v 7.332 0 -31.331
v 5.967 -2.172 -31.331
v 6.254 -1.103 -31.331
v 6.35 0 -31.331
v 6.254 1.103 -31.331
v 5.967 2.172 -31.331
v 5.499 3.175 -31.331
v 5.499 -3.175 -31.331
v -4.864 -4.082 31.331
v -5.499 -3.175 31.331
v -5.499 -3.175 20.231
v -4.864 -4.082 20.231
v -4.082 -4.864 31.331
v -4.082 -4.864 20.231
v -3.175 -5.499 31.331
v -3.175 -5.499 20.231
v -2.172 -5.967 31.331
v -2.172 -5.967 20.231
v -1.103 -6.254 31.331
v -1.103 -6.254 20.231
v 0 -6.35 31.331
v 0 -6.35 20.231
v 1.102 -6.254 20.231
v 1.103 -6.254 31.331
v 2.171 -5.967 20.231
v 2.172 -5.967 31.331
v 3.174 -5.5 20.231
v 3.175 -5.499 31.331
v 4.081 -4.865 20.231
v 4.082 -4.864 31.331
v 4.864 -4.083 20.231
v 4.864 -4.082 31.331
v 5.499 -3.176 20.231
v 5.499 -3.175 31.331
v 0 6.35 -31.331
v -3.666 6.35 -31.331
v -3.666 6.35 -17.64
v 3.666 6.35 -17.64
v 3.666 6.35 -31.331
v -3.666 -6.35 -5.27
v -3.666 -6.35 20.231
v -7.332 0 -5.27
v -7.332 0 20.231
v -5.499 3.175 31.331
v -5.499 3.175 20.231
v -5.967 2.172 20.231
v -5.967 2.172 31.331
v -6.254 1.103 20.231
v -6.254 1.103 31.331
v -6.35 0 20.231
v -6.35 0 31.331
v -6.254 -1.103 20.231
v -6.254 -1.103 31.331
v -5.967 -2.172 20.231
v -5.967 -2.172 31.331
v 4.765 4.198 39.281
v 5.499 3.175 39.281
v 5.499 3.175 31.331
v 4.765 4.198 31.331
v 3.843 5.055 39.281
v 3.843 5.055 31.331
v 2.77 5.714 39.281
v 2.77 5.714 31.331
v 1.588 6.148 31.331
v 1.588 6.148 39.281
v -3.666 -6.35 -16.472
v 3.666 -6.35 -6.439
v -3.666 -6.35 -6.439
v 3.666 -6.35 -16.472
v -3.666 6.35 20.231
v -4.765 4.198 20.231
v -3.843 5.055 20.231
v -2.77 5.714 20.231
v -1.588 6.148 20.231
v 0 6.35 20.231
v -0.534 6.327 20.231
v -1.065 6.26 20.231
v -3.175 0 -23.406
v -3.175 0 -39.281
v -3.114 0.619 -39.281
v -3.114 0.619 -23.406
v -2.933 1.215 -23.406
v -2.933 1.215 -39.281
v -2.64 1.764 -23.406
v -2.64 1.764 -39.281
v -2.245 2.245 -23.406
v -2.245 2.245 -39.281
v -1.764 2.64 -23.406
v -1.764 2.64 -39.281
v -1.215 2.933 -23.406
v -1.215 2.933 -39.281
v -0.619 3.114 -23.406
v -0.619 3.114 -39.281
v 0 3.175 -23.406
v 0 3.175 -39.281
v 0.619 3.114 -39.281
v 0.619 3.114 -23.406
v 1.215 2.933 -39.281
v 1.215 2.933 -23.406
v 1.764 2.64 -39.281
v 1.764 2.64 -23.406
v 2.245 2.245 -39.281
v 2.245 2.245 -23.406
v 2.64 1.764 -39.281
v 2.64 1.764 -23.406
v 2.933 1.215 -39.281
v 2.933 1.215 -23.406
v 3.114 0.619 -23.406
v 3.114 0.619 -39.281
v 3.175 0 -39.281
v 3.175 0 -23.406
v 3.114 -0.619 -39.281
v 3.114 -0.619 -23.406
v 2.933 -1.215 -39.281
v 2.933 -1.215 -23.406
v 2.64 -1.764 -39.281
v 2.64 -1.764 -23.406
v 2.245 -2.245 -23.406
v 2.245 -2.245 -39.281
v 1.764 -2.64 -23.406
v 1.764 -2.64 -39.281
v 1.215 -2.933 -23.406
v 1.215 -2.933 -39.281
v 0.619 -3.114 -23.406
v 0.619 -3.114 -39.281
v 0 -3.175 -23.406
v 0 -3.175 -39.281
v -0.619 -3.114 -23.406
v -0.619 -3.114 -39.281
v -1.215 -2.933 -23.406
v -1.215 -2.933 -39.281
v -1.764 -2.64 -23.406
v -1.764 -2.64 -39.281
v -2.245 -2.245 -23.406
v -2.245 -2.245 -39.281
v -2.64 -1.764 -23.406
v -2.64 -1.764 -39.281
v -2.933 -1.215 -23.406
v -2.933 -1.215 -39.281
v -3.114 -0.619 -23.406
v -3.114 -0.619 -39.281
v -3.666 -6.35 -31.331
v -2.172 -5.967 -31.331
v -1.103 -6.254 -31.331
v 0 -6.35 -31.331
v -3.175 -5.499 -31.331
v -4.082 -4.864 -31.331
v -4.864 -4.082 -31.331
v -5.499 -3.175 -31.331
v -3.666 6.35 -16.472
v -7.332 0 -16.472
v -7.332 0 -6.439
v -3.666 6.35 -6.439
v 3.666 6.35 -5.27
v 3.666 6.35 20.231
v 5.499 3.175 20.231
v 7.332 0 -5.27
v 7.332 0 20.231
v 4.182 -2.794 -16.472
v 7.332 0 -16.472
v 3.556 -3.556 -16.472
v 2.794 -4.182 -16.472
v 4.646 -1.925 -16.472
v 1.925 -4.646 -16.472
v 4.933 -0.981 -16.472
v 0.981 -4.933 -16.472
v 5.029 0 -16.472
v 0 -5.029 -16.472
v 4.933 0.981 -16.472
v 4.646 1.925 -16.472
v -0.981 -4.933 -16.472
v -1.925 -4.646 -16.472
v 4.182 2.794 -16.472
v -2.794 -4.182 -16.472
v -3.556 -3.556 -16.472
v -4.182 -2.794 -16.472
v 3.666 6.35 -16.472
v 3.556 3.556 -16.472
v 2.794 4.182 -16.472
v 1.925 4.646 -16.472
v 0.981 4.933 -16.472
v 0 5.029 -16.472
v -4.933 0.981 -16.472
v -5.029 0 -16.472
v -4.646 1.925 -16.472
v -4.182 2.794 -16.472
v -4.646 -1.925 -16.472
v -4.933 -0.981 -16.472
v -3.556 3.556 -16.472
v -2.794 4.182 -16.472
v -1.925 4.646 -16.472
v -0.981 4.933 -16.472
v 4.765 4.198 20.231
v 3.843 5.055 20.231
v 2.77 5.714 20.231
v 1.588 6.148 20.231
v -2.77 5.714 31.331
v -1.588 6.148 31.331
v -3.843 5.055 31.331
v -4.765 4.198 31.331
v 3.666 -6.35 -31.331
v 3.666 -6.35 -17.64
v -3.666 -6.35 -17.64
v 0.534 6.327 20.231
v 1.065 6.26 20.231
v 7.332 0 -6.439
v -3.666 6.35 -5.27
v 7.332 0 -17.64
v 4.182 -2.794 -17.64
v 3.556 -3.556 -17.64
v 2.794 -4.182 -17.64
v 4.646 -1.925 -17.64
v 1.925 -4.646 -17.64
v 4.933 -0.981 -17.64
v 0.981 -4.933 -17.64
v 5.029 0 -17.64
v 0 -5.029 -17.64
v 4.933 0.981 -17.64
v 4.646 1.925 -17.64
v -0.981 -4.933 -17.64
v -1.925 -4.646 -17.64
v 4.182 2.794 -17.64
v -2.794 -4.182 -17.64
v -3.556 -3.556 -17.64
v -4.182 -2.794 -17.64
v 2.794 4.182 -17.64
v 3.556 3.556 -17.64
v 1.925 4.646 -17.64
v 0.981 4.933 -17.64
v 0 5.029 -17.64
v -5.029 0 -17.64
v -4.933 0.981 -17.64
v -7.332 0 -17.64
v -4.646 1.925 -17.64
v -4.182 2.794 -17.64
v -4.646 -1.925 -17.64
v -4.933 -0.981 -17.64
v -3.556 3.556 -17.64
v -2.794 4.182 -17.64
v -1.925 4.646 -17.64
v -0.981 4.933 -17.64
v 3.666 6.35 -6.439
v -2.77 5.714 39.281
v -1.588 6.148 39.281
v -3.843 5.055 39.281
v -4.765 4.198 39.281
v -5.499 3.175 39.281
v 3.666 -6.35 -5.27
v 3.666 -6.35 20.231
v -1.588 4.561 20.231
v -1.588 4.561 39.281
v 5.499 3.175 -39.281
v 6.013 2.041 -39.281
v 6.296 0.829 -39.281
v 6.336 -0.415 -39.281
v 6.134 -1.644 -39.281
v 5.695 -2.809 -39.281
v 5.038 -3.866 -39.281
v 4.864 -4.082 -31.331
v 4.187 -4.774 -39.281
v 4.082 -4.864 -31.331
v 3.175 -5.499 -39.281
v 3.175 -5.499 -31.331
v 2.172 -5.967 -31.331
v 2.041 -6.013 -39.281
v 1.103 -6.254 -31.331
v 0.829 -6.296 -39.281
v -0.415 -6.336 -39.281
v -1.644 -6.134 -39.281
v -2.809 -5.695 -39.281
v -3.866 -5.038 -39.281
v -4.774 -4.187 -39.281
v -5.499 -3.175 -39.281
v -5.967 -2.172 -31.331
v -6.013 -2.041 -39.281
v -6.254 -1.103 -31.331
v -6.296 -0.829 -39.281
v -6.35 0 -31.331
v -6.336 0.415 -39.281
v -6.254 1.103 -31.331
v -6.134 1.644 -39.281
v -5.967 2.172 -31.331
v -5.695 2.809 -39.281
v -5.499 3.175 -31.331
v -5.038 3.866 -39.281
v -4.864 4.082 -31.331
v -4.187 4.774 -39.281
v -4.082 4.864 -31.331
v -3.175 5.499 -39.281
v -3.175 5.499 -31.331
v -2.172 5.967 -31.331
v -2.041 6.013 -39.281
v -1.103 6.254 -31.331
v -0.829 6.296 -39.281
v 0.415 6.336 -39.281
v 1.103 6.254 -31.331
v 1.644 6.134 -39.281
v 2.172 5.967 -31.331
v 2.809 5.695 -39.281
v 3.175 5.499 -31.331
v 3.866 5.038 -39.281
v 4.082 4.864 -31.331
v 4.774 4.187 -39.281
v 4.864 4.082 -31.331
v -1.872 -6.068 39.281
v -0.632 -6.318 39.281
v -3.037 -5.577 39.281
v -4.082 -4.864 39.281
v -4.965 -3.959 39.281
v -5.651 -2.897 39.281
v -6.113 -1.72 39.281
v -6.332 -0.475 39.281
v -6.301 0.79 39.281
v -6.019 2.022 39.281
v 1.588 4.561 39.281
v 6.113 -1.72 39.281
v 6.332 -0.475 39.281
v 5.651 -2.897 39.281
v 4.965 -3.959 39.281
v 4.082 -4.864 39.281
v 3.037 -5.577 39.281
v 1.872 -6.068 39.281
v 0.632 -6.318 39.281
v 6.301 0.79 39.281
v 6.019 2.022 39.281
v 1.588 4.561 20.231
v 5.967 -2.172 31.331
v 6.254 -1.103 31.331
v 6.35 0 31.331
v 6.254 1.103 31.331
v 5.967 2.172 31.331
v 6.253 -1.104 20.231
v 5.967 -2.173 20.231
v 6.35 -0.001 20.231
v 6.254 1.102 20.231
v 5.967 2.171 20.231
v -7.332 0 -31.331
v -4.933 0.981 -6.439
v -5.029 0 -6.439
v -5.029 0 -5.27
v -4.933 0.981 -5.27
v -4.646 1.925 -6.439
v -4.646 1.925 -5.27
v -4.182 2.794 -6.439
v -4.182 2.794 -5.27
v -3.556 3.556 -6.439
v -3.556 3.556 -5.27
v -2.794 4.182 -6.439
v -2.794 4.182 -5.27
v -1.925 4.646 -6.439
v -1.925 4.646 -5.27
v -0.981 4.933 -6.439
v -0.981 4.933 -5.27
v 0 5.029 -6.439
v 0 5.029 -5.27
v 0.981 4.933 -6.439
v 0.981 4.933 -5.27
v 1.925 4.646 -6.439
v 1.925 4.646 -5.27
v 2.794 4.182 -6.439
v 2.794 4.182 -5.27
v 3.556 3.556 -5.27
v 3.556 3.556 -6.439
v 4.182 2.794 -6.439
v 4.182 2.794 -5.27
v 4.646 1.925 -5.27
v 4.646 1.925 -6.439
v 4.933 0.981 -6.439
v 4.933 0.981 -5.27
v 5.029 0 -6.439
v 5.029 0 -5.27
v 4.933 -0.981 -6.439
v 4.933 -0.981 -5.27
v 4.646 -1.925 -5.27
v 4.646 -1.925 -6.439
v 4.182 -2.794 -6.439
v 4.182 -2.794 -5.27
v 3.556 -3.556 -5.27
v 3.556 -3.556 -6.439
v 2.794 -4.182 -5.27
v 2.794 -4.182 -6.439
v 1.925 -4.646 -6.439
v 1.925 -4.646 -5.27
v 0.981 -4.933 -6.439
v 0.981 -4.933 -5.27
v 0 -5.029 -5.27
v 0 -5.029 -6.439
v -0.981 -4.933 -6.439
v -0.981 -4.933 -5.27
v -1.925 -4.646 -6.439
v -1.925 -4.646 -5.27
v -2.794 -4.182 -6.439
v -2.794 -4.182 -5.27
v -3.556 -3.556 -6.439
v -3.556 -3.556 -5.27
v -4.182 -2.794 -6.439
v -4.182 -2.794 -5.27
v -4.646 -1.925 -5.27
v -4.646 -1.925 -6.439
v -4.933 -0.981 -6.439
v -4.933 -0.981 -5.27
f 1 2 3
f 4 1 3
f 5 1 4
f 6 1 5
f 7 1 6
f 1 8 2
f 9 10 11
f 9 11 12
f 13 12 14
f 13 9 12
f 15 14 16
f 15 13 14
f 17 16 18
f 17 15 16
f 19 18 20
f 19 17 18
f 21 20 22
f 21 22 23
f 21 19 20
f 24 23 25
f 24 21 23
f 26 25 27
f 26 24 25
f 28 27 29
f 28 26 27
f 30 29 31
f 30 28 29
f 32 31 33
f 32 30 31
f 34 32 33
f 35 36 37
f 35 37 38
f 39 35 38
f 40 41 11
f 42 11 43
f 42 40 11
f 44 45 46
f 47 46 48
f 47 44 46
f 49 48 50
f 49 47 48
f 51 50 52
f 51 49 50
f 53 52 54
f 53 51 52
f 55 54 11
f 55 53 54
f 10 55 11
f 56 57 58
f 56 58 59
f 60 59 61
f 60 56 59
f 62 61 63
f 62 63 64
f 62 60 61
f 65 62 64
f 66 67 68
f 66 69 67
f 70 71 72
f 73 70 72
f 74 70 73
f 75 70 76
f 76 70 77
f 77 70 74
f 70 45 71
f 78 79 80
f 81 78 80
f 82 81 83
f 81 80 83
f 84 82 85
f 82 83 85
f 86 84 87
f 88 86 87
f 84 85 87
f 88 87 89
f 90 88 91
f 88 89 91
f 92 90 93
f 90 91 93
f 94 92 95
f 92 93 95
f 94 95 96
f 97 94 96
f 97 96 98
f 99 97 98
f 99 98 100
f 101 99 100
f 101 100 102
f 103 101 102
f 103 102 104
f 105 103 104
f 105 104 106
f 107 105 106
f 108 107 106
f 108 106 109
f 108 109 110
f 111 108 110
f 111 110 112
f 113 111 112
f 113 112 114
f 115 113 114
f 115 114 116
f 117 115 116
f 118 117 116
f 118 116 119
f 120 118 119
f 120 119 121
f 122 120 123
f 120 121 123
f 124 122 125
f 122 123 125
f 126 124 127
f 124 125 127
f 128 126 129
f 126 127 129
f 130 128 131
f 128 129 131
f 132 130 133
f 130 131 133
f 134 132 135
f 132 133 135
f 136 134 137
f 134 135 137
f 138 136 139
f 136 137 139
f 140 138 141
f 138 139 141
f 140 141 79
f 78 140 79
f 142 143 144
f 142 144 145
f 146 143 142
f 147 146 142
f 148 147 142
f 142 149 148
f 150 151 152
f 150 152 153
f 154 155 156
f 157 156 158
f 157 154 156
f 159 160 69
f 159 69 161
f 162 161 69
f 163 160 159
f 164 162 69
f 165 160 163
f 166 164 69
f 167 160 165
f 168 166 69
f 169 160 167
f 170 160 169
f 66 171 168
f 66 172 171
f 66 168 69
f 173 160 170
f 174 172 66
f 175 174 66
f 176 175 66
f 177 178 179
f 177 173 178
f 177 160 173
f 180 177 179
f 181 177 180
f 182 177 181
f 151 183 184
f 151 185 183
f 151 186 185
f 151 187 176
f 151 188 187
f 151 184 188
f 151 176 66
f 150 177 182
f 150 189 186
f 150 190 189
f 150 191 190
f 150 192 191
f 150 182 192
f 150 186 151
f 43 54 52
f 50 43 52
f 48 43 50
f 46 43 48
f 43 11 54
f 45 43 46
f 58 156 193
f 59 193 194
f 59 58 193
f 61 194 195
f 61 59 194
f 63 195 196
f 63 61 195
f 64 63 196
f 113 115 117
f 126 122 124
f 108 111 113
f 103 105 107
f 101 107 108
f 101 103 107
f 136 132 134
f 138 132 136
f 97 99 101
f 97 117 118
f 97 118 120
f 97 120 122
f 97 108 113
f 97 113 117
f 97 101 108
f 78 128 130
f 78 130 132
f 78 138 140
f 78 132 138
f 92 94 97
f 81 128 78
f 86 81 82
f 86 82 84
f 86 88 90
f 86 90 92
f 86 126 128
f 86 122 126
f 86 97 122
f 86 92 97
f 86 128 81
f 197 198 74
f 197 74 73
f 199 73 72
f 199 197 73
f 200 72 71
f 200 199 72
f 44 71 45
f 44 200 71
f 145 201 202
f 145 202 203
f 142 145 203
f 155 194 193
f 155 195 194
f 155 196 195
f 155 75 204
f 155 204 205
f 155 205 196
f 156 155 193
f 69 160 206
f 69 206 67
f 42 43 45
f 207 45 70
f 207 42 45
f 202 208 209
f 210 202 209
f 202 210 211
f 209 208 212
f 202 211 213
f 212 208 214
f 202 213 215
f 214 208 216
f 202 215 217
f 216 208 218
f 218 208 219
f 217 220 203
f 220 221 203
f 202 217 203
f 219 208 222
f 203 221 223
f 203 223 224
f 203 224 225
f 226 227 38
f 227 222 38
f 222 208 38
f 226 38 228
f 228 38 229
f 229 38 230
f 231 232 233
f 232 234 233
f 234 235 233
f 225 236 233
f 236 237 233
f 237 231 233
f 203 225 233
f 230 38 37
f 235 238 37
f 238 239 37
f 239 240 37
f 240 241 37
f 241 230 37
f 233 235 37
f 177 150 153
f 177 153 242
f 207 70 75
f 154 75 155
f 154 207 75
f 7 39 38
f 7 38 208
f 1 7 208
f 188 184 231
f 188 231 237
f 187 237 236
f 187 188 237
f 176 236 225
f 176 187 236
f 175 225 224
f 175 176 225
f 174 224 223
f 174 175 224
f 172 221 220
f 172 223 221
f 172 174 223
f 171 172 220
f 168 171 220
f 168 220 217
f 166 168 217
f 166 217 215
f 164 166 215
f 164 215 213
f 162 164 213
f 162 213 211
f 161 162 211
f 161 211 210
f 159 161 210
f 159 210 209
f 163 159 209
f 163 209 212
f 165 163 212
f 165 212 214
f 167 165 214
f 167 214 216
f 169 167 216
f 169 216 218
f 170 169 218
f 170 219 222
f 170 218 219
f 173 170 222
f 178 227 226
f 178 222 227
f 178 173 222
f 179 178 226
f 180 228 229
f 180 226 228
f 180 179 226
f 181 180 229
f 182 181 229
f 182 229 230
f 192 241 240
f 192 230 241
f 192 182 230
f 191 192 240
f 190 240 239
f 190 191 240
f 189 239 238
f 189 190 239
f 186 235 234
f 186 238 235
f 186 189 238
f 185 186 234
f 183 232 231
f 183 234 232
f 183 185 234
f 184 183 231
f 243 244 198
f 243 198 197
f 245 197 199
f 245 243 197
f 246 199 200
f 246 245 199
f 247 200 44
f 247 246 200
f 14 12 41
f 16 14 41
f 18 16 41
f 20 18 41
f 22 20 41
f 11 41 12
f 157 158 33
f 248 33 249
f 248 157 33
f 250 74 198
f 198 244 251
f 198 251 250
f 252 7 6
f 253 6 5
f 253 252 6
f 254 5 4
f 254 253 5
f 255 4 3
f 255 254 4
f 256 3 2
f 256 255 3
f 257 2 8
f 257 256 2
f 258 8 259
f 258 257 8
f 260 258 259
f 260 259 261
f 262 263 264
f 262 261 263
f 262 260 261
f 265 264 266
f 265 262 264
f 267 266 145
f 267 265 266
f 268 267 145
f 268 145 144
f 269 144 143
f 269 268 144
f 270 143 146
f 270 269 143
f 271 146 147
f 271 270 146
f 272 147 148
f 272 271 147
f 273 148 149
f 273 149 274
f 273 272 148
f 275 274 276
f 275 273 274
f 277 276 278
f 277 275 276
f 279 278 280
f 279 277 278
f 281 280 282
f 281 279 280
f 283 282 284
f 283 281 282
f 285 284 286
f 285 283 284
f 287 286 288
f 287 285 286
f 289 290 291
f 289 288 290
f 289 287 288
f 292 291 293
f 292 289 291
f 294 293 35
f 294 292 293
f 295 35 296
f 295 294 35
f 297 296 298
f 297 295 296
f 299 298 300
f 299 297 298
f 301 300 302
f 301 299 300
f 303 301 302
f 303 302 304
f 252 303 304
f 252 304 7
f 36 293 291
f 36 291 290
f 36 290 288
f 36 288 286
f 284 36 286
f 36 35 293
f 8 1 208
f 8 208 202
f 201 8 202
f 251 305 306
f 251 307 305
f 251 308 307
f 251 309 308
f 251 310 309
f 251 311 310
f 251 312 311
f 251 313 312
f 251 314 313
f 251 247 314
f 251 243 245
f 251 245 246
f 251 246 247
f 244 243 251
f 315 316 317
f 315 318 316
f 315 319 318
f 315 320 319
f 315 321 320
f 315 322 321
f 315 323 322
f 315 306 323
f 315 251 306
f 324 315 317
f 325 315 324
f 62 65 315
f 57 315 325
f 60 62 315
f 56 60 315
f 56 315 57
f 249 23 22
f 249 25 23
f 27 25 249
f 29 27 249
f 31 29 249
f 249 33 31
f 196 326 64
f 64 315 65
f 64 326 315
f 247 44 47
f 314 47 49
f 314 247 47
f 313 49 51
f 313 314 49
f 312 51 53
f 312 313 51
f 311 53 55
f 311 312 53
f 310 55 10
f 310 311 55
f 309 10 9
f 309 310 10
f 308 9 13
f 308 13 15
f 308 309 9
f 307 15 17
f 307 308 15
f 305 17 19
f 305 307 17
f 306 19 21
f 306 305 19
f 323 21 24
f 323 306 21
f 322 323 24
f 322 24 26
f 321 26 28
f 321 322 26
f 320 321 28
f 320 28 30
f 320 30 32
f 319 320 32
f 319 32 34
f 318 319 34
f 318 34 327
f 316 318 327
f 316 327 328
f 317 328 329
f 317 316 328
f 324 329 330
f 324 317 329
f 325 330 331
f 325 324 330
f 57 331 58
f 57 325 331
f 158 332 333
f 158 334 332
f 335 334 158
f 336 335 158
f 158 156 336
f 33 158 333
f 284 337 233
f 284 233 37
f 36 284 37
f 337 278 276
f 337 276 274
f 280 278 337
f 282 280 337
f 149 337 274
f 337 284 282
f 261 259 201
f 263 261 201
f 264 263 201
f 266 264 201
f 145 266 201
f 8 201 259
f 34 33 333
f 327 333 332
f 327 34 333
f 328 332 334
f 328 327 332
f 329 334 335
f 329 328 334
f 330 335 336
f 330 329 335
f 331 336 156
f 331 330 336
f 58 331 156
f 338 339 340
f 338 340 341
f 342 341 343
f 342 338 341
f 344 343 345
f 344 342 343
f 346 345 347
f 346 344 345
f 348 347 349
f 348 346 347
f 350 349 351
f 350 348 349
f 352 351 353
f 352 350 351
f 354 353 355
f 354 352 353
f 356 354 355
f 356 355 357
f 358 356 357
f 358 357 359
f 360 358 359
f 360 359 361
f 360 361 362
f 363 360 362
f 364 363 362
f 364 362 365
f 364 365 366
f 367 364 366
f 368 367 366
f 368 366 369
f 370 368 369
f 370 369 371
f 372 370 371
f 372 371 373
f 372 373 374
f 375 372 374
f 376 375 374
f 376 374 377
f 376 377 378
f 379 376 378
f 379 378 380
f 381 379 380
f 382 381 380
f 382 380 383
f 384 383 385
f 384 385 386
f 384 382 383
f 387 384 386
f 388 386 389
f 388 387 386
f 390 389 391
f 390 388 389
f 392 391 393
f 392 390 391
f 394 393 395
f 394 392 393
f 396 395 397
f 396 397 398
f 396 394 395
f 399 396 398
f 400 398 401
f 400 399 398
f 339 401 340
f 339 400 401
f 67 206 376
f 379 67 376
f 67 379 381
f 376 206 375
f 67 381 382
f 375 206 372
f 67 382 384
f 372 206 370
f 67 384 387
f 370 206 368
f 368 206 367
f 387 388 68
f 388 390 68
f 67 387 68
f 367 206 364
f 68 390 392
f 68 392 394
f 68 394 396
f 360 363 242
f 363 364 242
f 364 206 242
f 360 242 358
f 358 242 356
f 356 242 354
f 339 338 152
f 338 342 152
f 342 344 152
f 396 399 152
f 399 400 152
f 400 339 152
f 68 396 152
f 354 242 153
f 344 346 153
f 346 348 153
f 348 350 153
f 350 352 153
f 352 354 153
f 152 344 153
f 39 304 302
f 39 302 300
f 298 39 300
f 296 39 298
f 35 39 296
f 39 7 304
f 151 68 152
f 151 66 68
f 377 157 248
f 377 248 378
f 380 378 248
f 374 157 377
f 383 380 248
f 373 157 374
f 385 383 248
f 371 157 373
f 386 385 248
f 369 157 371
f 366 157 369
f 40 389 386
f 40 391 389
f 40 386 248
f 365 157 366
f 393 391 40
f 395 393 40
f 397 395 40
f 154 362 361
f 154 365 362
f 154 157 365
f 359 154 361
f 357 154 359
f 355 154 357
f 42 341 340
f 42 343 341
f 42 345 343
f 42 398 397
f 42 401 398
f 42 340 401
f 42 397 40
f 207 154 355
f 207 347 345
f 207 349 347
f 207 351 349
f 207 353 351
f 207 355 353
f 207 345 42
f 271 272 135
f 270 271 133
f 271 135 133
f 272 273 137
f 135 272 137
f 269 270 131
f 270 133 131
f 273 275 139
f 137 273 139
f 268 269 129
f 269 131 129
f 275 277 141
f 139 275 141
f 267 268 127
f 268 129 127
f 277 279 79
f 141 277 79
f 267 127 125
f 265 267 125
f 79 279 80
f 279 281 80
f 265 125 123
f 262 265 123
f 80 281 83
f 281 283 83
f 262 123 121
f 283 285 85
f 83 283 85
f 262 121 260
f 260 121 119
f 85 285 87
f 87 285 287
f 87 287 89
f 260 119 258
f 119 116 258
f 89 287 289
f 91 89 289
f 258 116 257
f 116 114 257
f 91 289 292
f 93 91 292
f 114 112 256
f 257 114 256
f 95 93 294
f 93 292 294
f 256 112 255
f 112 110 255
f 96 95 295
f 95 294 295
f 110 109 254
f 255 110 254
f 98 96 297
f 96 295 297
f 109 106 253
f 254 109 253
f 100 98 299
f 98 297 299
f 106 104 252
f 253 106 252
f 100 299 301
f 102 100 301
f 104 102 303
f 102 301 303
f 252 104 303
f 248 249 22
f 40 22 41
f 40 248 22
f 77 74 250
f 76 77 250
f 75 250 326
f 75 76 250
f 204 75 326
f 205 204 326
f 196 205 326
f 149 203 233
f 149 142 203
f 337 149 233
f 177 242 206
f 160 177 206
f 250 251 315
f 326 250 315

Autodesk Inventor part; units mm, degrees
ref_plane "YZ Plane" through (0, 0, 0) normal (1, 0, 0) x (0, 1, 0)
sketch "Sketch1" plane through (0, 0, 0) normal (0, 0, 1) x (1, 0, 0)
  line L0 (-3.666174, 6.35) -> (3.666174, 6.35)
  line L1 (3.666174, 6.35) -> (7.332348, 0)
  line L2 (7.332348, 0) -> (3.666174, -6.35)
  line L3 (3.666174, -6.35) -> (-3.666174, -6.35)
  line L4 (-3.666174, -6.35) -> (-7.332348, 0)
  line L5 (-7.332348, 0) -> (-3.666174, 6.35)
  line L6 (-10.265288, 0) -> (10.265288, 0)
  line L7 (0, -8.89) -> (0, 8.89)
  point P0 (0, 0)
  point P1 (0, 0)
  dimension "d0" = 12.7
extrude "Extrusion1" add sketch "Sketch1" along normal mid plane 78.5622
sketch "Sketch5" plane through (0, 0, 39.2811) normal (0, 0, 1) x (1, 0, 0)
  line L0 (3.666174, 6.35) -> (7.332348, 0)
  line L1 (-3.666174, 6.35) -> (3.666174, 6.35)
  line L2 (-7.332348, 0) -> (-3.666174, 6.35)
  line L3 (-3.666174, -6.35) -> (-7.332348, 0)
  line L4 (3.666174, -6.35) -> (-3.666174, -6.35)
  line L5 (7.332348, 0) -> (3.666174, -6.35)
  circle A0 centre (0, 0) radius 6.35
extrude "Bearing Insert" cut sketch "Sketch5" against normal blind 7.9502 contours L0 A0 L1 | L0 L5 A0 | A0 L2 L1 | A0 L3 L2 | L5 L4 A0 | A0 L4 L3
mirror "Bearing Insert Mirror" about plane through (0, 0, 0) normal (0, 0, 1) of "Bearing Insert"
sketch "Sketch6" plane through (0, 0, -39.2811) normal (0, 0, -1) x (-1, 0, 0)
  circle A0 centre (0, 0) radius 6.35 projected
  circle A1 centre (0, 0) radius 3.175
  dimension "d11" = 6.35
extrude "Extrusion5" cut sketch "Sketch6" against normal blind 15.875 contours A1
ref_plane "Work Plane2" through (3.666174, 6.35, -16.4719) normal (0, 0, -1) x (-1, 0, 0)
sketch "Sketch7" plane through (3.666174, 6.35, -16.4719) normal (0, 0, -1) x (-1, 0, 0)
  line L0 (0, 0) -> (3.666174, 0)
  line L1 (-1.833087, -3.175) -> (0, 0)
  circle A0 centre (3.666174, -6.35) radius 5.0292
  circle A1 centre (3.666174, -6.35) radius 7.332348
  dimension "d16" = 10.0584
extrude "Extrusion6" cut sketch "Sketch7" along normal blind 1.1684
ref_plane "Work Plane3" through (0, 0, -6.4389) normal (0, 0, -1) x (-1, 0, 0)
sketch "Sketch8" plane through (0, 0, -6.4389) normal (0, 0, -1) x (-1, 0, 0)
  line L0 (5.499261, 3.175) -> (7.332348, 0)
  line L1 (7.332348, 0) -> (5.499261, -3.175)
  circle A0 centre (0, 0) radius 5.0292
  circle A1 centre (0, 0) radius 7.332348
  point P0 (0, 0)
  dimension "d20" = 10.0584
extrude "Extrusion7" cut sketch "Sketch8" against normal blind 1.1684
sketch "Sketch9" plane through (0, 0, 39.2811) normal (0, 0, 1) x (1, 0, 0)
  circle A0 centre (0, 0) radius 6.35
  line L0 (-3.666174, 6.35) -> (0, 6.35)
  line L1 (-5.499261, 3.175) -> (-3.666174, 6.35)
  circle A1 centre (0, 0) radius 7.332348
sketch "Sketch9 outline for Extrusion8" plane through (0, 0, 39.2811) normal (0, 0, 1) x (1, 0, 0)
  circle A0 centre (0, 0) radius 7.332348
  arc A1 (-5.499261, 3.175) -> (0, 6.35) centre (0, 0) ccw
  arc A2 (0, 6.35) -> (-5.499261, 3.175) centre (0, 0) ccw
extrude "Extrusion8" cut sketch "Sketch9 outline for Extrusion8" against normal blind 19.05
sketch "Sketch10" plane through (0, 0, 39.2811) normal (0, 0, 1) x (1, 0, 0)
  circle A0 centre (0, 0) radius 6.35
  line L0 (-1.5875, 6.148361) -> (-1.5875, 4.560861)
  line L1 (-1.5875, 4.560861) -> (1.5875, 4.560861)
  line L2 (1.5875, 4.560861) -> (1.5875, 6.148361)
  line L3 (-10.265288, 0) -> (10.265288, 0)
  line L4 (0, -8.89) -> (0, 8.89)
  point P0 (0, 4.560861)
  dimension "d25" = 3.175
  dimension "d26" = 1.5875
extrude "Extrusion9" cut sketch "Sketch10" against normal up to surface (19.05 mm away) contours L2 L1 L4 A0 | L4 L1 L0 A0
equation "\"d26\" = 0.5 * d25"
properties part number "output_shaft" material "Steel"
